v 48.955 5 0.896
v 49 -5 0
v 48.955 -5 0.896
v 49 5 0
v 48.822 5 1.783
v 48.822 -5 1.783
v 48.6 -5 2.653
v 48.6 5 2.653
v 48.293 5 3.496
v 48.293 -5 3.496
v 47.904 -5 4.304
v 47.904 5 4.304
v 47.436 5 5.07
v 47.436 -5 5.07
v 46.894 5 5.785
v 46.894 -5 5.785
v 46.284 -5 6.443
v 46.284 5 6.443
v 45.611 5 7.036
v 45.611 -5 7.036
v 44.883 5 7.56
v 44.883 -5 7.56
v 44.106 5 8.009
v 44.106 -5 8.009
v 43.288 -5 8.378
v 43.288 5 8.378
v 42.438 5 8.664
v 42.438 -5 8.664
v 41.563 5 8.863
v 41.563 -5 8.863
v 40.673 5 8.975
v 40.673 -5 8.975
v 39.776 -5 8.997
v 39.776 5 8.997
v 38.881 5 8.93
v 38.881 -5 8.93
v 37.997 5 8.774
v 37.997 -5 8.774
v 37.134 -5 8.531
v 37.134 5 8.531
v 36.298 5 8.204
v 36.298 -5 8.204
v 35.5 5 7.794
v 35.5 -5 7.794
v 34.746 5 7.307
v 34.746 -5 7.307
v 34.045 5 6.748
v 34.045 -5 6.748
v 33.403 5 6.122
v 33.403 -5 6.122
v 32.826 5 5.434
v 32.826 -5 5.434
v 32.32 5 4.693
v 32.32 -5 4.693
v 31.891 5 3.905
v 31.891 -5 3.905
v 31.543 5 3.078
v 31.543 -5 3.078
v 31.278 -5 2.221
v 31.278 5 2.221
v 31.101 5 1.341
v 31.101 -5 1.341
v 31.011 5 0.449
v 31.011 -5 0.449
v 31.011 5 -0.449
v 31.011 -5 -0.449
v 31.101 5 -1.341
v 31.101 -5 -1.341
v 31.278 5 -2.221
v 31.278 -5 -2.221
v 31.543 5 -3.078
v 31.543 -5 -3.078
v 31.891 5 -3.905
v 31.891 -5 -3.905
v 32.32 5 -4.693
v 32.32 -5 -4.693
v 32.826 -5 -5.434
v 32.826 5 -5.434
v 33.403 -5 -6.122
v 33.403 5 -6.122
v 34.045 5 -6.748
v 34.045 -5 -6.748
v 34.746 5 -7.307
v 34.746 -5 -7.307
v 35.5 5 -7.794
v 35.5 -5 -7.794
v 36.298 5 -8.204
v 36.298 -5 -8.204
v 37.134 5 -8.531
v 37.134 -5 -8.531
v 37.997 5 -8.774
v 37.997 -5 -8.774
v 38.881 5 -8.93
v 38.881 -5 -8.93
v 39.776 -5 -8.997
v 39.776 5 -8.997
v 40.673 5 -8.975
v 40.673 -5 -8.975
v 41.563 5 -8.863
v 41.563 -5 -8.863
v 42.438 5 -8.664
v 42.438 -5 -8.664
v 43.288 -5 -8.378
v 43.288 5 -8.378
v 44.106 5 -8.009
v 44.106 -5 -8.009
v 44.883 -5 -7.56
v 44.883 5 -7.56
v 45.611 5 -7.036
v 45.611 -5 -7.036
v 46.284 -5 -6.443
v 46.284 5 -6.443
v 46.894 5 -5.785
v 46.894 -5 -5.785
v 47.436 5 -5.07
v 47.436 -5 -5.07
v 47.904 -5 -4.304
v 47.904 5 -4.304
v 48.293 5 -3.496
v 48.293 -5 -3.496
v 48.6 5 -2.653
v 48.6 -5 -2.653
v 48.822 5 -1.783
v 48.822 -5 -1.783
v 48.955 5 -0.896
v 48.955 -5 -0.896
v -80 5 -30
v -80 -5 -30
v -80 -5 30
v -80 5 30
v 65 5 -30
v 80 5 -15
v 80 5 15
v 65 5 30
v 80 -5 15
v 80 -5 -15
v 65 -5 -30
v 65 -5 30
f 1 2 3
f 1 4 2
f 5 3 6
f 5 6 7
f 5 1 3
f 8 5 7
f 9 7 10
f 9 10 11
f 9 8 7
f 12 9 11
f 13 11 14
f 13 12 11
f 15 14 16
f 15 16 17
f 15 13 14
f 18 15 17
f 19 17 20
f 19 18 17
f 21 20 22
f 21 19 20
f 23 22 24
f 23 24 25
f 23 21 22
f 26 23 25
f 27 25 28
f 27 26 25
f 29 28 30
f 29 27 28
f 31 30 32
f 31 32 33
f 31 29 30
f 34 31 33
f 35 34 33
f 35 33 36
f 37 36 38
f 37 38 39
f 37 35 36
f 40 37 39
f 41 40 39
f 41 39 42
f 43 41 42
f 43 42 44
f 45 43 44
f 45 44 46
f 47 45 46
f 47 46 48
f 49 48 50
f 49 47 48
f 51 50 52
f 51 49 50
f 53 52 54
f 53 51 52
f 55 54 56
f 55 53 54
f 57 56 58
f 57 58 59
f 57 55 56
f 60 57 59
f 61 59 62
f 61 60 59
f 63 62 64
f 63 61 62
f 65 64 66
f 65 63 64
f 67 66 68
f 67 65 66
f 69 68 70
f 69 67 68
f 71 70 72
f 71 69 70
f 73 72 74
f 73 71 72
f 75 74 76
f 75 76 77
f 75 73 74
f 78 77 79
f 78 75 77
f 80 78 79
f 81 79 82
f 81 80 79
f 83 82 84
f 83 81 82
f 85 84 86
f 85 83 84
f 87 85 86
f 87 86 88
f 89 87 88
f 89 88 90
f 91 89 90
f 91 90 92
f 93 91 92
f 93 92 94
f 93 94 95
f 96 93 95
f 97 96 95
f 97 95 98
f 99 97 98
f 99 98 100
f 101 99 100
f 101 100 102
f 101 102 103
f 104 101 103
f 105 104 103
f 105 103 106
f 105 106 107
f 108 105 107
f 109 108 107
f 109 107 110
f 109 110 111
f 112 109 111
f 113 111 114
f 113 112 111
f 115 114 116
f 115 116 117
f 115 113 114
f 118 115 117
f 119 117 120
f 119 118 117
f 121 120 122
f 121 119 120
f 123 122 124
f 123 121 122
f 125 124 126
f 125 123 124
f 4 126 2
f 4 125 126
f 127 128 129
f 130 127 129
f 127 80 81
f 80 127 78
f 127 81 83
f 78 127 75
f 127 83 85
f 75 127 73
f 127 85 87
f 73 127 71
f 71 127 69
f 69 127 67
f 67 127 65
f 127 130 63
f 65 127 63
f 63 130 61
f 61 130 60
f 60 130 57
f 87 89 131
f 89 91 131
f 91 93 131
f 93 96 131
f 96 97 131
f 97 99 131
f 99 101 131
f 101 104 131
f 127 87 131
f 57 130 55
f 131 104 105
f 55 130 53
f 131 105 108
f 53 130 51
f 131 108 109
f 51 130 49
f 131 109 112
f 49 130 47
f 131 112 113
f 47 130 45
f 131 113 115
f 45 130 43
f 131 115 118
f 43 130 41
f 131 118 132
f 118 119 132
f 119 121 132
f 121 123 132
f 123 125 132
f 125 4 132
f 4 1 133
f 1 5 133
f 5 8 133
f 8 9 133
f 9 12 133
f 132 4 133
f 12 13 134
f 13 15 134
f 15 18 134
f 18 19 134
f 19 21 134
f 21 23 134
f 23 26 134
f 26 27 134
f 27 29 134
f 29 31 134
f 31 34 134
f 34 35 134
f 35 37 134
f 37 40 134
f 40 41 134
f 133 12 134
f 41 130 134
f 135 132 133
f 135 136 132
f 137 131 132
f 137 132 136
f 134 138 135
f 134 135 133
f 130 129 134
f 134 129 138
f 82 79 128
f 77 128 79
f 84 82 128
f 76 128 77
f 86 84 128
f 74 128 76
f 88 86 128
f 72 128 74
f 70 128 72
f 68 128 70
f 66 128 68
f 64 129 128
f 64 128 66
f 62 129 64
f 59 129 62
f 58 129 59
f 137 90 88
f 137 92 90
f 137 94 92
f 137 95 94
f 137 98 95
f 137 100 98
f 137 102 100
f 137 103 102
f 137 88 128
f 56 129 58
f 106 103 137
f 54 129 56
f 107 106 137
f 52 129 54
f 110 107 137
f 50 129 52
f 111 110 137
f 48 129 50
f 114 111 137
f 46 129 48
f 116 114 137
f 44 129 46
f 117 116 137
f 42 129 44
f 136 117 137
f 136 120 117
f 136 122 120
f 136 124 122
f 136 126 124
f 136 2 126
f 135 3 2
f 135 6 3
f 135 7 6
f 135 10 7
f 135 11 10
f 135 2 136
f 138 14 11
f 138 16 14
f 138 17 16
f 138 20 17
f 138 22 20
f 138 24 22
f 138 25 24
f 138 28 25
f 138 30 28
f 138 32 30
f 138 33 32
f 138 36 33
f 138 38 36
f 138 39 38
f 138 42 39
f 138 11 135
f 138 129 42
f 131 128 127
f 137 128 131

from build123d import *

# Parameters (mm, degrees)
F0_W     = 160
F0_H     = 60
F0_R     = 9
F1_DEPTH = 5
F2_SIZE  = 15


with BuildPart() as f1:
    # F0 (on Front) → F1 (new body, symmetric)
    with BuildSketch(Plane.XZ):
        Rectangle(F0_W, F0_H)
        with Locations((40, 0)):
            Circle(F0_R, mode=Mode.SUBTRACT)
    extrude(amount=F1_DEPTH, both=True)

    # F2
    f2_edges = [f1.edges().sort_by_distance(p)[0] for p in [
        (80, 0, 30),
        (80, 0, -30),
    ]]
    chamfer(f2_edges, length=F2_SIZE)


solid = f1.part
